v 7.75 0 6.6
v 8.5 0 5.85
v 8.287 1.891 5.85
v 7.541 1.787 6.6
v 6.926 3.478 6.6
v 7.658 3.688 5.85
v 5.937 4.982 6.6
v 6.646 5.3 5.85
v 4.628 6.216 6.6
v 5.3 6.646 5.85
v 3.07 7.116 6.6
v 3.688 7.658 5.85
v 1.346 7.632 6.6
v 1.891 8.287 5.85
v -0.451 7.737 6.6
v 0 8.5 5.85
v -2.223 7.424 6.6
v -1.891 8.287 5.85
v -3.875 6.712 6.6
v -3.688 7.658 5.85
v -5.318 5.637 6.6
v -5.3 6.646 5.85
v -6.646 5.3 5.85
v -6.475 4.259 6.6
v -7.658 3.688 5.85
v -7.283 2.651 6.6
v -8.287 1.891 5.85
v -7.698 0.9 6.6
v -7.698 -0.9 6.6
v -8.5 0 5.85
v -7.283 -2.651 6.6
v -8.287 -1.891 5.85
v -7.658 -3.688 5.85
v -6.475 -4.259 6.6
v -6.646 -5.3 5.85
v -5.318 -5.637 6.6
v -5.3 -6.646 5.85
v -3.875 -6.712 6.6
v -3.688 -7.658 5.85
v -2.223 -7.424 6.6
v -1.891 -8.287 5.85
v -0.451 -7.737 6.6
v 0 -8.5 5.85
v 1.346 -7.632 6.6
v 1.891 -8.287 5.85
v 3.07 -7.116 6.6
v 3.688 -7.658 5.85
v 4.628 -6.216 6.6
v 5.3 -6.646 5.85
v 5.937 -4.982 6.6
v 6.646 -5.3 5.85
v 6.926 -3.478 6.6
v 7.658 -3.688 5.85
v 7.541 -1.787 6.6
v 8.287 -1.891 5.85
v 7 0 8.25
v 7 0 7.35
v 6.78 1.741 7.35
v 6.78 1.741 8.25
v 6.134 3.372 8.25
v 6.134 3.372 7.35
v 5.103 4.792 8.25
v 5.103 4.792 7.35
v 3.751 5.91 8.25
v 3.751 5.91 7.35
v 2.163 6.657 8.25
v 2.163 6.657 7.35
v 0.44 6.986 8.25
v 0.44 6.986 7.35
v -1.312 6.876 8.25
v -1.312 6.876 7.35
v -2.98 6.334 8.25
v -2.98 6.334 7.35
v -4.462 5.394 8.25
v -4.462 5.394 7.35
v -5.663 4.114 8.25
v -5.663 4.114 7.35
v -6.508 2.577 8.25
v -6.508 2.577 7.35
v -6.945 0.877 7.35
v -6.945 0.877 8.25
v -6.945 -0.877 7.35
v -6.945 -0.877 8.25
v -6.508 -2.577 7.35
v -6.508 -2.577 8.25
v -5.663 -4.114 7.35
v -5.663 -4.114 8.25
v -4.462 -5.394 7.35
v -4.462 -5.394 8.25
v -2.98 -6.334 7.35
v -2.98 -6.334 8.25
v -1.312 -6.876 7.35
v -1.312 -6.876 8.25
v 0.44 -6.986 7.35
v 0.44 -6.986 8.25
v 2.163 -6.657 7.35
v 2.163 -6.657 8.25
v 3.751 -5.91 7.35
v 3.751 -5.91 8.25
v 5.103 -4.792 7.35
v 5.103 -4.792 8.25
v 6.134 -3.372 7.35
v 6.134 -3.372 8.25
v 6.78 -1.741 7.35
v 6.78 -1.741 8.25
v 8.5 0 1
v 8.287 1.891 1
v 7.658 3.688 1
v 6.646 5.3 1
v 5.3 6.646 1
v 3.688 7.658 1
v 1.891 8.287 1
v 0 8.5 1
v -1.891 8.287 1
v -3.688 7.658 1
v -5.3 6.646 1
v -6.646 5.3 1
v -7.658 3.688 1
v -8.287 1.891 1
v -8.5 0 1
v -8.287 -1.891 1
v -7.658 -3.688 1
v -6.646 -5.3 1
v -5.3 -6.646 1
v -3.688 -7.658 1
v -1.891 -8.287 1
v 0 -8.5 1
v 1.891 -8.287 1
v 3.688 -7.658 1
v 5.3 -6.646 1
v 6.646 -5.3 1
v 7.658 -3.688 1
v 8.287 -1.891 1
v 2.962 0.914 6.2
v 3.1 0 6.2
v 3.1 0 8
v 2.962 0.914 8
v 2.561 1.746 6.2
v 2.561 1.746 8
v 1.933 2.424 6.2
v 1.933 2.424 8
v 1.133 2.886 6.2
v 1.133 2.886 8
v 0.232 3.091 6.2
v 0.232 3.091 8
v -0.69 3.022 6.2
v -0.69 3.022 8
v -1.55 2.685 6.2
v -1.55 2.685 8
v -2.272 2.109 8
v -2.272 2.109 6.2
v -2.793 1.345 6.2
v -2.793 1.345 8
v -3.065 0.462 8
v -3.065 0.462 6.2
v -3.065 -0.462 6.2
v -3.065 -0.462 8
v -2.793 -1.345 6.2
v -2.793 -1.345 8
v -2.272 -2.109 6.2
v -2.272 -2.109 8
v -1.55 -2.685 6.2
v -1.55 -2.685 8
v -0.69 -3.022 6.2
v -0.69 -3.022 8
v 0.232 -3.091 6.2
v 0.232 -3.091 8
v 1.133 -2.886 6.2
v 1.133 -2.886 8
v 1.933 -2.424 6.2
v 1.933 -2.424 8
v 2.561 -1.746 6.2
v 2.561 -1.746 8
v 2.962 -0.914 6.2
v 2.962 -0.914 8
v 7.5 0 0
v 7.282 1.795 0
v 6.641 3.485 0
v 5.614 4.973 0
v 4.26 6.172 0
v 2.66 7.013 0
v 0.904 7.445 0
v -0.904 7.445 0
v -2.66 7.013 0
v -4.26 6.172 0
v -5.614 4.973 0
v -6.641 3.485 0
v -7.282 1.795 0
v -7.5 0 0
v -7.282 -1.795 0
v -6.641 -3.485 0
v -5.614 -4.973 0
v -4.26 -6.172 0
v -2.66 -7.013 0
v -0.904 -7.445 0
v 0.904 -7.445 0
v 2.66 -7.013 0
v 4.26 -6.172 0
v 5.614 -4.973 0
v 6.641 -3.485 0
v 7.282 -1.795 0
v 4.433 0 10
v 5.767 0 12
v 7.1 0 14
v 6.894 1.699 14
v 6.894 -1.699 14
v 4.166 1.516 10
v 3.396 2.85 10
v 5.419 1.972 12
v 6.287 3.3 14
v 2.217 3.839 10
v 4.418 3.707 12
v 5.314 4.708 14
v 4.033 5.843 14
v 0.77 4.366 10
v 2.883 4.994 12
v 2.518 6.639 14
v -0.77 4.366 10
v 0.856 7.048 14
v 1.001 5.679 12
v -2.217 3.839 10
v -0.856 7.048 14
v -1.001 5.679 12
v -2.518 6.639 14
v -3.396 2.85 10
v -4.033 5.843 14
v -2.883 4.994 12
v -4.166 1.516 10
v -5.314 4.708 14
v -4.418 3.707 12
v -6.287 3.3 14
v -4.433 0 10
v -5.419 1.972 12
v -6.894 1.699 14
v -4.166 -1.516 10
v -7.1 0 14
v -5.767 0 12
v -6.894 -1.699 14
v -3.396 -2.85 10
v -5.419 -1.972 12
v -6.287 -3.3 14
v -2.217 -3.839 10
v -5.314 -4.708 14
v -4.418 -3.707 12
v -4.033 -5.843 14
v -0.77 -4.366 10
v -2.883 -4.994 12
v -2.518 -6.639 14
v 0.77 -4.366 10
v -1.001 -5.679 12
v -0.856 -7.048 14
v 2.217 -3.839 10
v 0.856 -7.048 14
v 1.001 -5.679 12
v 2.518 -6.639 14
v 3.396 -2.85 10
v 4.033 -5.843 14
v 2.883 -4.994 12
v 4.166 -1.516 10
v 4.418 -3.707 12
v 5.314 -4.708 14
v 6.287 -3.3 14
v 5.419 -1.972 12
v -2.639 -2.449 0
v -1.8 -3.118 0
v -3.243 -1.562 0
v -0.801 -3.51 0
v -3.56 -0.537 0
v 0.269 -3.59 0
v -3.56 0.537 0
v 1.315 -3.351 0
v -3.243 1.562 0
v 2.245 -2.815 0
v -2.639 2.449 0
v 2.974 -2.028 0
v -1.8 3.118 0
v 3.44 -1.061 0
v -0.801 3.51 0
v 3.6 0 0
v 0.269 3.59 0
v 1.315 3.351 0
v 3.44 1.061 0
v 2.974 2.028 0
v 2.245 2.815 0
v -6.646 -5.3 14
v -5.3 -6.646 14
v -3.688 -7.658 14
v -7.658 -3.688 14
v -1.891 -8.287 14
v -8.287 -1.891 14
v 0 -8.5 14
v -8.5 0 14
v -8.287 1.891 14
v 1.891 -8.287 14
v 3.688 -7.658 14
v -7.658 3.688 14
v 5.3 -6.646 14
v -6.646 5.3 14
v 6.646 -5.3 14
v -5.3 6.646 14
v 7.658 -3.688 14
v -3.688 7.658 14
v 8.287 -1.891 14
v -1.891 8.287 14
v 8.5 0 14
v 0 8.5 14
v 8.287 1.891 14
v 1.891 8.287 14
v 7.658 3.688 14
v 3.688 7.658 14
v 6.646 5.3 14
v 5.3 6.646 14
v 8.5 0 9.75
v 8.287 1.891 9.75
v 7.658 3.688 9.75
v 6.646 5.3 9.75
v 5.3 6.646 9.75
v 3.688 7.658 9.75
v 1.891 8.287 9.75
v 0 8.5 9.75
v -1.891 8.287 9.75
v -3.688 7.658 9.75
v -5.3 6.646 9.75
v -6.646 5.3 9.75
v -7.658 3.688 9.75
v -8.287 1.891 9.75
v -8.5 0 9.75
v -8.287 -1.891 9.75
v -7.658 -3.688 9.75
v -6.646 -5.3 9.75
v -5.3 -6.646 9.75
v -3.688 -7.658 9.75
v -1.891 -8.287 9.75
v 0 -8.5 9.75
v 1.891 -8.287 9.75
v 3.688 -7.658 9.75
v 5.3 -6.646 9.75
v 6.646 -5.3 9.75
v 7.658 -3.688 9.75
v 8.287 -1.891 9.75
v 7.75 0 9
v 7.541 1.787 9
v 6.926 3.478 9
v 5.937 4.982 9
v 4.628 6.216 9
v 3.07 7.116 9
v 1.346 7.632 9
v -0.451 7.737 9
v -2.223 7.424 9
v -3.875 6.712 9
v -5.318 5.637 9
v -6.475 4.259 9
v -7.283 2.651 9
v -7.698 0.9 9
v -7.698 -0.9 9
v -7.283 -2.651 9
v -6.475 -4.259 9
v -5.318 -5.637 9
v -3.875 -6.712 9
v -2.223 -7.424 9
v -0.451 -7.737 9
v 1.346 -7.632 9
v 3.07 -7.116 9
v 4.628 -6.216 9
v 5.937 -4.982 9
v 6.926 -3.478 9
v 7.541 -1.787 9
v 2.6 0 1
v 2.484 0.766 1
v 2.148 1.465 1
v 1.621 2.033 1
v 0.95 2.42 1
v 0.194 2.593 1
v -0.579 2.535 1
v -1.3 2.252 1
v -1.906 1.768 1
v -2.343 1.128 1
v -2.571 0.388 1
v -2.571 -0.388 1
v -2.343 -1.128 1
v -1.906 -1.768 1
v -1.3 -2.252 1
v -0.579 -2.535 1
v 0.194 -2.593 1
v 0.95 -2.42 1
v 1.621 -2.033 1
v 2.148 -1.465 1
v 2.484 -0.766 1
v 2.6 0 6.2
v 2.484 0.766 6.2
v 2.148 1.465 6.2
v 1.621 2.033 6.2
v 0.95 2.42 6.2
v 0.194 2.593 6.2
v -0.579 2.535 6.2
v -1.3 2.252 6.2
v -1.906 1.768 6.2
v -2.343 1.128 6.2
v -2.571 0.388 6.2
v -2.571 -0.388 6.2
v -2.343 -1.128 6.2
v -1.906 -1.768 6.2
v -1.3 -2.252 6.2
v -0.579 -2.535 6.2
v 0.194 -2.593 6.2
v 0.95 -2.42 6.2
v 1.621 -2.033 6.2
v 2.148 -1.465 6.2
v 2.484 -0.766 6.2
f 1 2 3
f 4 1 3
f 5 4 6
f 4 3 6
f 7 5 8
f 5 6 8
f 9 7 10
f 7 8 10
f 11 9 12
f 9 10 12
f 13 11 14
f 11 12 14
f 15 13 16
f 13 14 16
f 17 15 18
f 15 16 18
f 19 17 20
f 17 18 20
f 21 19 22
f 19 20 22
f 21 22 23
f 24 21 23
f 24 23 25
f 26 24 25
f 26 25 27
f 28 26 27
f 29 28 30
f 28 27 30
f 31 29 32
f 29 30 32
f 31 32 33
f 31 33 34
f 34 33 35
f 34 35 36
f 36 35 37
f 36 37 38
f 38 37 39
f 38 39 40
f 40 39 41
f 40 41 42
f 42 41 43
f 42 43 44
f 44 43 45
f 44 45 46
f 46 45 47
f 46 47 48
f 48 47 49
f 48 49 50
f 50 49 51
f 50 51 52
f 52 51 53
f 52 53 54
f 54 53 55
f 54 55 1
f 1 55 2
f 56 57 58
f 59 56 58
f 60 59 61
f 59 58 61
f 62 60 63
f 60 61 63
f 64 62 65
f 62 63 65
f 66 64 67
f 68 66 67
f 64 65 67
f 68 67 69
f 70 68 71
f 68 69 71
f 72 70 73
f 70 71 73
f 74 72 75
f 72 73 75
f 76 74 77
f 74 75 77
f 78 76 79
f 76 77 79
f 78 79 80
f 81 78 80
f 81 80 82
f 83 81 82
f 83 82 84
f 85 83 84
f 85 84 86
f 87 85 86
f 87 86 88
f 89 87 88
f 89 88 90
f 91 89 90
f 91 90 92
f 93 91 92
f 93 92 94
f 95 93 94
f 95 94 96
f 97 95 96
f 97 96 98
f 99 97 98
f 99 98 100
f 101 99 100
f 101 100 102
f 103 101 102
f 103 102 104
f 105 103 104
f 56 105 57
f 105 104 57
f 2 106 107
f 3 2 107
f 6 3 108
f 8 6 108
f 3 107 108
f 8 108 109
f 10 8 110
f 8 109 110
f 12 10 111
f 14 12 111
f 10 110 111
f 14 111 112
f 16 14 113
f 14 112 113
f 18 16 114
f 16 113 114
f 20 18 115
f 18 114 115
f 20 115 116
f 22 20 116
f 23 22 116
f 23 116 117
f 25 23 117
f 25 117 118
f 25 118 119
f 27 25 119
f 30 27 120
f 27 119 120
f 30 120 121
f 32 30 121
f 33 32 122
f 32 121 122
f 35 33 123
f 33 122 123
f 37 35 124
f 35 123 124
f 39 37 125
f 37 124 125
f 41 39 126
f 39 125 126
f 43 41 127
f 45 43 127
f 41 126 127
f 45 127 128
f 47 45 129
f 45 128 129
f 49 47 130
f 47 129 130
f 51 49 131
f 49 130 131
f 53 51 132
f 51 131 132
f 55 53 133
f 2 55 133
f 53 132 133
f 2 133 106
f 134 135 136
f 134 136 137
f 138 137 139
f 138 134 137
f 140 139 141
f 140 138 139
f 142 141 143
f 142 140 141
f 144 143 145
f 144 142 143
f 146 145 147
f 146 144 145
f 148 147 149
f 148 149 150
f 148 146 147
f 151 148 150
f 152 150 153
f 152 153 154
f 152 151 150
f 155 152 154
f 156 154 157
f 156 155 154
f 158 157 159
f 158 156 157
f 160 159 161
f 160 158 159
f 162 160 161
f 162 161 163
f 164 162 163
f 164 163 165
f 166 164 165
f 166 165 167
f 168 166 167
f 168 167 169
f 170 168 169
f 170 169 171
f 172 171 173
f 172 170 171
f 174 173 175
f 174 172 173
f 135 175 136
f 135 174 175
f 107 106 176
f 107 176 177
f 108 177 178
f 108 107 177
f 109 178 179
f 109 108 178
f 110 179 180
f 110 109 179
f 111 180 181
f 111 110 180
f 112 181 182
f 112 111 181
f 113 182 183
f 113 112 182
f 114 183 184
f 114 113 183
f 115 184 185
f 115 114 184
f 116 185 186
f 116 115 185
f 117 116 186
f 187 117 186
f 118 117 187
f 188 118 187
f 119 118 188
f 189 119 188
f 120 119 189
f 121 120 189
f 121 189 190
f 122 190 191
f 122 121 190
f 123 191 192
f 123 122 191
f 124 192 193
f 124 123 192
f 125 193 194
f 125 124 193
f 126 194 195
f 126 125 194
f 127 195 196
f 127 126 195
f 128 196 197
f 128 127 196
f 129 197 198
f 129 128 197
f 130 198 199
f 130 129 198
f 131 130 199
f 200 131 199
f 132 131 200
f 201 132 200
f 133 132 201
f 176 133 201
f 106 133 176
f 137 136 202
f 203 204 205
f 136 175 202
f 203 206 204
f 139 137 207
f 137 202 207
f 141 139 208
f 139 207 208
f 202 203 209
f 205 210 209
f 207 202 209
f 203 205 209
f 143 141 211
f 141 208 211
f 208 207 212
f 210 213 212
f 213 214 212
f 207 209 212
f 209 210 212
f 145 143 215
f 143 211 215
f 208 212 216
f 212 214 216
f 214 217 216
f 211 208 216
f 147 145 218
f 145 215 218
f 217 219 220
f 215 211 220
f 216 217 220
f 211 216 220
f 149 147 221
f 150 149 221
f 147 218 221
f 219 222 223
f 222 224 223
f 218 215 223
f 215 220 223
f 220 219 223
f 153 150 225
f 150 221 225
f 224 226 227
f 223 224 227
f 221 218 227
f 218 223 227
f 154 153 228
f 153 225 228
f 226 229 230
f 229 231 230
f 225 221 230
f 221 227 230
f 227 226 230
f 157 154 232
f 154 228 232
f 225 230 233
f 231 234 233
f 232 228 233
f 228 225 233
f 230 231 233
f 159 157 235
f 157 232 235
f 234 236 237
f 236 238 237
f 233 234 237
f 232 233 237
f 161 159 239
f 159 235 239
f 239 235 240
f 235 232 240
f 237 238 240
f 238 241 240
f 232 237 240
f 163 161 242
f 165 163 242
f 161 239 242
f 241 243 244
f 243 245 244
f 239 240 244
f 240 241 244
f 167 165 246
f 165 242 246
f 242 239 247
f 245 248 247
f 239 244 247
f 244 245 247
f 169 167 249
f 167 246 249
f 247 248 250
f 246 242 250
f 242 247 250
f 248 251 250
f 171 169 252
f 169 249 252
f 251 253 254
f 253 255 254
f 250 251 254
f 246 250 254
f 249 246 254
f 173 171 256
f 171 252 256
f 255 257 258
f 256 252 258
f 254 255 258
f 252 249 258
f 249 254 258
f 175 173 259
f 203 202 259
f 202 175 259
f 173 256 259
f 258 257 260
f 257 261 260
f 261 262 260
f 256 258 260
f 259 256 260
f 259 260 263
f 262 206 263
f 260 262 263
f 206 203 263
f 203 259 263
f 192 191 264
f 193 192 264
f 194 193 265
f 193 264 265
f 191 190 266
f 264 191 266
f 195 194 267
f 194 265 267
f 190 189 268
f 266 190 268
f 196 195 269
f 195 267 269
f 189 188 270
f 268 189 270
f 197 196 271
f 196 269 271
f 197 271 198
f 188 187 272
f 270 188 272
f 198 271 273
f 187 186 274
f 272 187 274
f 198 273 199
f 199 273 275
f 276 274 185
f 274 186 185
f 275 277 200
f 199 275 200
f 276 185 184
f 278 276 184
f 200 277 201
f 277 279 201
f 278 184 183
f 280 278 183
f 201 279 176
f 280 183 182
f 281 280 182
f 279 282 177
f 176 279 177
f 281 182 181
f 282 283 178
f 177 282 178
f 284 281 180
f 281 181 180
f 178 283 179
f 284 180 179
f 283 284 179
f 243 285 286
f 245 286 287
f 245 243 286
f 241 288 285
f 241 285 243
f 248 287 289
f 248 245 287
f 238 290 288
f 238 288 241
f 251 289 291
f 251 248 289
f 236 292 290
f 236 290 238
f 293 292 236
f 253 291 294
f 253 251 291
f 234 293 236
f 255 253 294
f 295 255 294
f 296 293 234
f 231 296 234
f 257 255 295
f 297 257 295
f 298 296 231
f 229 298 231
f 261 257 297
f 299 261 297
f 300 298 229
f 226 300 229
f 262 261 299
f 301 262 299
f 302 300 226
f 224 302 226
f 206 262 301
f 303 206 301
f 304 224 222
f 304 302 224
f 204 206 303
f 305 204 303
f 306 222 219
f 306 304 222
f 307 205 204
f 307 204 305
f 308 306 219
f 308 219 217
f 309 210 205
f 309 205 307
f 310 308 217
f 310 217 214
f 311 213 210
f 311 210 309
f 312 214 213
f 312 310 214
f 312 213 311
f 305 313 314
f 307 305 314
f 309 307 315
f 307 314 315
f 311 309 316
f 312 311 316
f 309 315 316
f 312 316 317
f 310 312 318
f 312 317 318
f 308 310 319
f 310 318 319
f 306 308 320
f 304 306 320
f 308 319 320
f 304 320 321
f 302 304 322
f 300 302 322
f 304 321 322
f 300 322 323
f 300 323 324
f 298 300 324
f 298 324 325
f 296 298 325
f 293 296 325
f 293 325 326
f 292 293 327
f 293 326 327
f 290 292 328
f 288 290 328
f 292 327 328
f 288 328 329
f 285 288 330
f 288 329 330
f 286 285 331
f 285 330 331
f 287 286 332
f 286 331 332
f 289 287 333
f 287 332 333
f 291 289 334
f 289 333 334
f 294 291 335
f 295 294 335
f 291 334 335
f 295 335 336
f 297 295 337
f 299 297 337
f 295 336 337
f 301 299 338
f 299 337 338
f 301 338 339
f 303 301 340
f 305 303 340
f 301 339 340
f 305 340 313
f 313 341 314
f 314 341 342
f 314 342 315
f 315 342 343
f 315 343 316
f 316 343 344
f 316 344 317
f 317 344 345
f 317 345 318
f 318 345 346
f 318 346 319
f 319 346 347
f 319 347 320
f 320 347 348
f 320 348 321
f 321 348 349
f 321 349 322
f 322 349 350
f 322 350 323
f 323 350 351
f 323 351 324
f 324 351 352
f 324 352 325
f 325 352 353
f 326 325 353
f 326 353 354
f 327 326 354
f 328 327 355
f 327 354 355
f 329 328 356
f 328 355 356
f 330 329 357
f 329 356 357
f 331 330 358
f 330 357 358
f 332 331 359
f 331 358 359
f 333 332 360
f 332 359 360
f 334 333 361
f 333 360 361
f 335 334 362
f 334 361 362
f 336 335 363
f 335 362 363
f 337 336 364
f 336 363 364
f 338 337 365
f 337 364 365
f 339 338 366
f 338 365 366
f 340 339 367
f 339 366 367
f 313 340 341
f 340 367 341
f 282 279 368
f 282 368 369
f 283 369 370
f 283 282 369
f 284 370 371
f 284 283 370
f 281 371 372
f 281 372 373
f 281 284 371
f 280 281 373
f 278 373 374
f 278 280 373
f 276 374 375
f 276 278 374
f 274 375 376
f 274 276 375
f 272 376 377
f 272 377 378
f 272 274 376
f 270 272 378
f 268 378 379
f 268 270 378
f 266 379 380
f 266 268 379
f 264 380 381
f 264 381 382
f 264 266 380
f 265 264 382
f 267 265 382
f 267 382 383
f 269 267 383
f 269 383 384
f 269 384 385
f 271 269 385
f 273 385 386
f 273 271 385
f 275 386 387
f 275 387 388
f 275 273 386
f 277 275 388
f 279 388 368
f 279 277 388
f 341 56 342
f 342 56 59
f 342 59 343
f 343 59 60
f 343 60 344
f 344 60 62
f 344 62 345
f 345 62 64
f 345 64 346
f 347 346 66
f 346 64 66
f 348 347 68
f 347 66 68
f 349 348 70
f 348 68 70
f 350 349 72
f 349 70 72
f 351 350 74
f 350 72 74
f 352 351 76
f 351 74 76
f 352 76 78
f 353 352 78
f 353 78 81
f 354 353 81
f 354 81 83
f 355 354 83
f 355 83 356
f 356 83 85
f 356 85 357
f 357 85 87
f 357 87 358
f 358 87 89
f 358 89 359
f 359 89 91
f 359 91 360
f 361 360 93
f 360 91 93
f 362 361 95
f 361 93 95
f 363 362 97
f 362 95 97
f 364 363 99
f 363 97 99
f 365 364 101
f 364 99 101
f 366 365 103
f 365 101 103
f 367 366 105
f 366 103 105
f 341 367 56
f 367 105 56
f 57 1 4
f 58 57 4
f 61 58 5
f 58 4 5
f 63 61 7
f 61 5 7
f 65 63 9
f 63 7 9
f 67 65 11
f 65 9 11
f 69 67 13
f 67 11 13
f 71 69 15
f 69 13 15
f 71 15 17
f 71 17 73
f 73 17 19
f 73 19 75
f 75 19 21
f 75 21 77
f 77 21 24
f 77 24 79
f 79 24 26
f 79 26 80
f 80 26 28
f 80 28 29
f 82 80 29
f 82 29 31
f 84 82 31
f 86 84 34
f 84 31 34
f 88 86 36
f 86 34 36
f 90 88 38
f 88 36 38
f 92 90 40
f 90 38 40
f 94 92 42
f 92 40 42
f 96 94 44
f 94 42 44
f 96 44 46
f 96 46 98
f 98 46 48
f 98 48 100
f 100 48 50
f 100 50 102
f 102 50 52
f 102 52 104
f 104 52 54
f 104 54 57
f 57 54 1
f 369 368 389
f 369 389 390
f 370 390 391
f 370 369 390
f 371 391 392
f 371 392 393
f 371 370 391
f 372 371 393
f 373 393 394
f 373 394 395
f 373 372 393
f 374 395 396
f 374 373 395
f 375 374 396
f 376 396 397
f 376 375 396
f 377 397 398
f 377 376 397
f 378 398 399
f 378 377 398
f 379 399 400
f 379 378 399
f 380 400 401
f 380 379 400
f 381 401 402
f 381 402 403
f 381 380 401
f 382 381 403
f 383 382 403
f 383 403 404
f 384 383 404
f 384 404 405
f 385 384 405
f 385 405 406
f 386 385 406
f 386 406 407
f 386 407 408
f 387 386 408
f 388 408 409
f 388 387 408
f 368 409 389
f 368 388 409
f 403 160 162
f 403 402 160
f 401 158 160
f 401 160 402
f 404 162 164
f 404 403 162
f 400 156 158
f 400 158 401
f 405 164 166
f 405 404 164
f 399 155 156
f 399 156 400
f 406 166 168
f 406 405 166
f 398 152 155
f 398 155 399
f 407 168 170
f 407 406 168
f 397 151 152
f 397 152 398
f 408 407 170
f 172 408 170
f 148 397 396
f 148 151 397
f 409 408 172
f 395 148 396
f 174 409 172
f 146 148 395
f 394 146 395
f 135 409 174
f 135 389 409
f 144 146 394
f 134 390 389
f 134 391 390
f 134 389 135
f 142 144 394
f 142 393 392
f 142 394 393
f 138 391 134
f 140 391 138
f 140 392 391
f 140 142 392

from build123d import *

# Parameters (mm, degrees)
F0_R     = 8.5
F0_R_2   = 7
F1_DEPTH = 6.6
F0_R_3   = 3.1
F2_DEPTH = 9
F3_R     = 8.5
F3_R_2   = 7
F3_R_3   = 3.1
F4_DEPTH = 5
F0_R_4   = 2.6
F5_DEPTH = 6.2
F6_SIZE  = 1
F7_SIZE2 = 4
F7_SIZE  = 6
F8_SIZE  = 0.74999


# Not quite as in the source:
# - a fillet or chamfer is up to 0.001 mm smaller than in the source, because OpenCascade refuses the exact size


with BuildPart() as f1:
    # F0 (on Top) → F1 (new body)
    with BuildSketch(Plane.XY):
        Circle(F0_R)
        Circle(F0_R_2, mode=Mode.SUBTRACT)
    extrude(amount=F1_DEPTH)

    # F0 (on Top) → F2 (join)
    with BuildSketch(Plane.XY):
        Circle(F0_R_2)
        Circle(F0_R_3, mode=Mode.SUBTRACT)
    extrude(amount=F2_DEPTH)

    # F3 (on face) → F4 (join)
    with BuildSketch(Plane.XY.offset(9)):
        Circle(F3_R)
        Circle(F3_R_2, mode=Mode.SUBTRACT)
        Circle(F3_R_2)
        Circle(F3_R_3, mode=Mode.SUBTRACT)
    extrude(amount=F4_DEPTH)

    # F0 (on Top) → F5 (join)
    with BuildSketch(Plane.XY):
        Circle(F0_R_3)
        Circle(F0_R_4, mode=Mode.SUBTRACT)
    extrude(amount=F5_DEPTH)

    # F6
    f6_edges = [f1.edges().sort_by_distance(p)[0] for p in [
        (-2.6, 0, 0),
        (-8.5, 0, 0),
    ]]
    chamfer(f6_edges, length=F6_SIZE)

    # F7
    f7_edges = [f1.edges().sort_by_distance(p)[0] for p in [
        (-3.1, 0, 14),
    ]]
    f7_side = f1.faces().sort_by_distance((-3.1, 0, 10.1))[0]
    chamfer(f7_edges, length=F7_SIZE, length2=F7_SIZE2, reference=f7_side)

    # F8 (size 0.75 in the source; OpenCascade refuses exactly that, so slightly less here)
    f8_edges = [f1.edges().sort_by_distance(p)[0] for p in [
        (-7, 0, 9),
        (-7, 0, 6.6),
        (-8.5, 0, 6.6),
        (-8.5, 0, 9),
    ]]
    chamfer(f8_edges, length=F8_SIZE)


solid = f1.part
